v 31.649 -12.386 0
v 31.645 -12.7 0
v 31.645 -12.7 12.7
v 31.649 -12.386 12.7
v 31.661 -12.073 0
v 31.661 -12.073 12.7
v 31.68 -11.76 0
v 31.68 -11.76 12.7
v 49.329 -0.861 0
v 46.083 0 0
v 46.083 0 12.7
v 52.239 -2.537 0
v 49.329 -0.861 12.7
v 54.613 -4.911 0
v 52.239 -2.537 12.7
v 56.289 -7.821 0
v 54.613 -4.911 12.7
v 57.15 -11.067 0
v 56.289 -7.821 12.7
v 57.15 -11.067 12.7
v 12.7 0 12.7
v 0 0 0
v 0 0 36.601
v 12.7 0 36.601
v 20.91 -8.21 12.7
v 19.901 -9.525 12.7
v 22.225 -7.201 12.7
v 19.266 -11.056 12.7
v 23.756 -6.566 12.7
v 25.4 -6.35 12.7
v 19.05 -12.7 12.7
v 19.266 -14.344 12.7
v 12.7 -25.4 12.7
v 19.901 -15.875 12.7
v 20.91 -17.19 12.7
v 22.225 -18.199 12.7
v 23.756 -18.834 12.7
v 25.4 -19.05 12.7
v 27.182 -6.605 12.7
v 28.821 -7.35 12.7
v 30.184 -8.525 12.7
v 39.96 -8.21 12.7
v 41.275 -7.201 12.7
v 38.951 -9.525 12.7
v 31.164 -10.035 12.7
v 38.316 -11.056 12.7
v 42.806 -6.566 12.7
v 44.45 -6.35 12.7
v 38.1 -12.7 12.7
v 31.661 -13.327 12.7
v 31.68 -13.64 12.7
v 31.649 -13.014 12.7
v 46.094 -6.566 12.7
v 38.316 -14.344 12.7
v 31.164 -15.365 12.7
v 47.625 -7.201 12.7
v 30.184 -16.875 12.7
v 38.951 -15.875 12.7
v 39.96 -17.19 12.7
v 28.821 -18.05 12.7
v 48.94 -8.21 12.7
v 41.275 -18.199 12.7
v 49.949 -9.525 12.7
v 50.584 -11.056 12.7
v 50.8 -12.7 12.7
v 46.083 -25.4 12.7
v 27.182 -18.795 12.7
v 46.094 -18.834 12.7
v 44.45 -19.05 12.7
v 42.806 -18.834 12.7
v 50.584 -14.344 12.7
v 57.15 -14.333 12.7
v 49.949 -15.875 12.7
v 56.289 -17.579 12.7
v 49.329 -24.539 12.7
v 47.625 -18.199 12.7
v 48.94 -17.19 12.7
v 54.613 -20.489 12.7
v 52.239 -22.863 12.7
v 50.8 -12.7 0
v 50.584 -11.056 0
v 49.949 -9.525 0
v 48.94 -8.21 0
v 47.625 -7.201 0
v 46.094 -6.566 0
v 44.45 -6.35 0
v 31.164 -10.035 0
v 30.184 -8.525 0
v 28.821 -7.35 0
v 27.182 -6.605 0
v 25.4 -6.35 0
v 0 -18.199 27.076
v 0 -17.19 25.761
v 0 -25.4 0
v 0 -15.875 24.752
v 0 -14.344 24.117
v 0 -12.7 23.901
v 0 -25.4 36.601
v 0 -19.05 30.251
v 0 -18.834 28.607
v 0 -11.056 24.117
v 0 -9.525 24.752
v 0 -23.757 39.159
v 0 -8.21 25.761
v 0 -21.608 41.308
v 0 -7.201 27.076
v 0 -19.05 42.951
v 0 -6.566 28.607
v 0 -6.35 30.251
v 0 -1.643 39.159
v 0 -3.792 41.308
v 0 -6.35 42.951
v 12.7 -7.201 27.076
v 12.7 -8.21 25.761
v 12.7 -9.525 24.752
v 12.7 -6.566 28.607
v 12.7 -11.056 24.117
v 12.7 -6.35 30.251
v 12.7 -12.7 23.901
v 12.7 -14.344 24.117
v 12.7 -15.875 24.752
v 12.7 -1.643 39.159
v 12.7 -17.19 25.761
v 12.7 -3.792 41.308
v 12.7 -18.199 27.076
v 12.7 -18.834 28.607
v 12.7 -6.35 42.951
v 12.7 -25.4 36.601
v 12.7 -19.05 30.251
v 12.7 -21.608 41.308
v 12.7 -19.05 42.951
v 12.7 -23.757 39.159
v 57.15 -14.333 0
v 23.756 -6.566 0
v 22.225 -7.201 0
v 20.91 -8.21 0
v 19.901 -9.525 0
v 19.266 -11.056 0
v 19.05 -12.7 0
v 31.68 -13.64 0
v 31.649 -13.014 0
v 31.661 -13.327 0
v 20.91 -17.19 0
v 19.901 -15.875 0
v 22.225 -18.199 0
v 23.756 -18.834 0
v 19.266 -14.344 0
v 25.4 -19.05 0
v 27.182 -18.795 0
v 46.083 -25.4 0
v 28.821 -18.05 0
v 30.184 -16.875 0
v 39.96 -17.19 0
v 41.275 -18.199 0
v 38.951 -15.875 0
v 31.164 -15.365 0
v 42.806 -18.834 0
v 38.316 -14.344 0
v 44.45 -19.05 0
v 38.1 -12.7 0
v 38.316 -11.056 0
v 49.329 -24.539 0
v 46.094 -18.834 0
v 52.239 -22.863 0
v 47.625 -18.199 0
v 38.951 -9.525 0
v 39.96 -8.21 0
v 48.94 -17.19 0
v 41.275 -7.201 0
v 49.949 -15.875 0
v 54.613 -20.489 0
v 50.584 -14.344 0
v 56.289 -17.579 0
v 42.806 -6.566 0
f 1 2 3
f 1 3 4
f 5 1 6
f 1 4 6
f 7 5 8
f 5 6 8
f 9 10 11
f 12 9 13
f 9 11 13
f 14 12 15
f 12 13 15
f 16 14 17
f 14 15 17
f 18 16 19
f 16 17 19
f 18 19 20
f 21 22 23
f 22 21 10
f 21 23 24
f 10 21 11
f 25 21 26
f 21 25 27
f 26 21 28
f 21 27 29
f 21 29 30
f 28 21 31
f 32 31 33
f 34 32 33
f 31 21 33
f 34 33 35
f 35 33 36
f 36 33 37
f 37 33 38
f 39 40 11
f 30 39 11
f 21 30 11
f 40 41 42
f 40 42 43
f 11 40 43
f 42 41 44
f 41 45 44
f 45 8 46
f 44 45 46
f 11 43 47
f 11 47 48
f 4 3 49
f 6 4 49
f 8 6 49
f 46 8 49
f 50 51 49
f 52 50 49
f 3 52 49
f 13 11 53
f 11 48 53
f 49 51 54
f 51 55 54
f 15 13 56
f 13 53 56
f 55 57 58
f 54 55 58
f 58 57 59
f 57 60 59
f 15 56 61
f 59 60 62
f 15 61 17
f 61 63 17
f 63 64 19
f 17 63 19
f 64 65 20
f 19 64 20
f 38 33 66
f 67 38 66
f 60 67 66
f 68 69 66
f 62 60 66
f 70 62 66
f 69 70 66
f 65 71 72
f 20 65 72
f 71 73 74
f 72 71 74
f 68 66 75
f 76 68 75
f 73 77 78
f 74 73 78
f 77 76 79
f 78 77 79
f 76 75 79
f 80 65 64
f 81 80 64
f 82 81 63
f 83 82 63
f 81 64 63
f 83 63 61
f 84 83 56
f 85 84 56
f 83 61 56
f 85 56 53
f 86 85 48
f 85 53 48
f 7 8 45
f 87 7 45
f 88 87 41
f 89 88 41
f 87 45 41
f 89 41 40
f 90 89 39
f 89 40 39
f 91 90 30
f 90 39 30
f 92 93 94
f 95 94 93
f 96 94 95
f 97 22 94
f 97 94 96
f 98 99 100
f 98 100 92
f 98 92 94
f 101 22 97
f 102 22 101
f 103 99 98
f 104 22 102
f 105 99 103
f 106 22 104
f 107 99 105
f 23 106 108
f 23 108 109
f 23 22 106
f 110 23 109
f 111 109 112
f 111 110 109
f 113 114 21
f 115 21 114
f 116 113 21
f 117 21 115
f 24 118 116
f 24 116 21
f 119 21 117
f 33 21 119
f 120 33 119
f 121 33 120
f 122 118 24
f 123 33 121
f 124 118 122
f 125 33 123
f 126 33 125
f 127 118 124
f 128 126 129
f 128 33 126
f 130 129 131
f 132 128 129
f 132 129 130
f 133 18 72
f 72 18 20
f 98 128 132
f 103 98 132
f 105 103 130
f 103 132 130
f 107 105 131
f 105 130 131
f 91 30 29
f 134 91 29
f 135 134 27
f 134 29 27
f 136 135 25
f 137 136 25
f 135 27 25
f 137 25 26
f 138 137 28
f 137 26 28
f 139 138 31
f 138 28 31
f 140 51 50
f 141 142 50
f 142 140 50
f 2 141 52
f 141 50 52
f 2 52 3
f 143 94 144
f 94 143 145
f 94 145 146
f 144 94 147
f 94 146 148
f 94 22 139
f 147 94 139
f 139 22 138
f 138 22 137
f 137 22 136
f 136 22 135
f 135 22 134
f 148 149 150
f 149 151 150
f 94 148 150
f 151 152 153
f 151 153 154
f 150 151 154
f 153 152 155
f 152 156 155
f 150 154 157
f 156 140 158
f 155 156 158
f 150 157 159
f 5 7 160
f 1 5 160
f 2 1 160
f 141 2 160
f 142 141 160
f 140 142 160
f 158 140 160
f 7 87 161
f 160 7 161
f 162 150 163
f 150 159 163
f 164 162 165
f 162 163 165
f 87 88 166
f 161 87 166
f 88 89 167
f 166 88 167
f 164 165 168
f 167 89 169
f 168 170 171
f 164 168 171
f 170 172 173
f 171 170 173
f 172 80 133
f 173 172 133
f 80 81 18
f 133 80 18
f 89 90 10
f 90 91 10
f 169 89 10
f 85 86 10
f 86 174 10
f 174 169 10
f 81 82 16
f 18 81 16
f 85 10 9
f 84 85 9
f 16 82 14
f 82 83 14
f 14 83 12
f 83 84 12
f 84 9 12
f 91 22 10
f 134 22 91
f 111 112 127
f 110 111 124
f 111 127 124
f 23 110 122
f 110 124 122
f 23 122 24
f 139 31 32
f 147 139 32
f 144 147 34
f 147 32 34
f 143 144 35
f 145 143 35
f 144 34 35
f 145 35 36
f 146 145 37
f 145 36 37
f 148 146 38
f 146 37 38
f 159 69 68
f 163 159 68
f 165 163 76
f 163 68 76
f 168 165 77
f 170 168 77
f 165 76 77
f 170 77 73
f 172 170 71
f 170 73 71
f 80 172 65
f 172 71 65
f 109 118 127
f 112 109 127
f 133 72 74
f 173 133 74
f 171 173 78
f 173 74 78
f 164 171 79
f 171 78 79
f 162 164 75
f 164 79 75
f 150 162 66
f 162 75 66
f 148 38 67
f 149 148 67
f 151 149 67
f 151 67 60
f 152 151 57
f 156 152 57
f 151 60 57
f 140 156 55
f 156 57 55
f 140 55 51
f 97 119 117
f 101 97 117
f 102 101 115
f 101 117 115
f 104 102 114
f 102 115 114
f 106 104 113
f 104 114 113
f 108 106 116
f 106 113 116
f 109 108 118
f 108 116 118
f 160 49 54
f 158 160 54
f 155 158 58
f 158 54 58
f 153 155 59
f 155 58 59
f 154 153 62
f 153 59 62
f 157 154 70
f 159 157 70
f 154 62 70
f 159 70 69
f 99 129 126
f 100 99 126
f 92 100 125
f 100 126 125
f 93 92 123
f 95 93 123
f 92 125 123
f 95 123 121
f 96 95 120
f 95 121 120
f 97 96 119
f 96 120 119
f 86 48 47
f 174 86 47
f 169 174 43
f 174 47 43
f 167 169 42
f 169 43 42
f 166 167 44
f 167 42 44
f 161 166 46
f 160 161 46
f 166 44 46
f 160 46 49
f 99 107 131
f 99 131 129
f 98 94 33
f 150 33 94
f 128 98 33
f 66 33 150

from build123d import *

# Parameters (mm, degrees)
F0_W     = 57.15
F0_H     = 44.45
F1_DEPTH = 25.4
F2_W     = 44.45
F2_H     = 31.75
F3_DEPTH = 25.4
F5_DEPTH = 25.4
F7_DEPTH = 25.4


with BuildPart() as f1:
    # F0 (on Front) → F1 (new body)
    with BuildSketch(Plane.XZ):
        with Locations((28.575, 22.225)):
            Rectangle(F0_W, F0_H)
    extrude(amount=F1_DEPTH)

    # F2 (on face) → F3 (cut)
    with BuildSketch(Plane.XZ.offset(25.4)):
        with Locations((34.925, 28.575)):
            Rectangle(F2_W, F2_H)
    extrude(amount=-F3_DEPTH, mode=Mode.SUBTRACT)

    # F4 (on face) → F5 (cut)
    with BuildSketch(Plane.YZ.offset(12.7)):
        with BuildLine():
            ThreePointArc((-19.05, 42.9509683429), (-15.9622689922, 44.0701615546), (-12.7, 44.45))
            Line((-12.7, 44.45), (-25.4, 44.45))
            Line((-25.4, 44.45), (-25.4, 36.6009683429))
            ThreePointArc((-25.4, 36.6009683429), (-22.740231571, 40.2911999139), (-19.05, 42.9509683429))
        make_face()
        with BuildLine():
            Line((0, 44.45), (-12.7, 44.45))
            ThreePointArc((-12.7, 44.45), (-9.4377310078, 44.0701615546), (-6.35, 42.9509683429))
            ThreePointArc((-6.35, 42.9509683429), (-2.659768429, 40.2911999139), (0, 36.6009683429))
            Line((0, 36.6009683429), (0, 44.45))
        make_face()
        with BuildLine():
            Line((-12.7, 36.6009683429), (-12.7, 44.45))
            ThreePointArc((-12.7, 44.45), (-15.9622689922, 44.0701615546), (-19.05, 42.9509683429))
            Line((-19.05, 42.9509683429), (-19.05, 30.2509683429))
            ThreePointArc((-19.05, 30.2509683429), (-17.1901280605, 34.7410964034), (-12.7, 36.6009683429))
        make_face()
        with BuildLine():
            ThreePointArc((-6.35, 42.9509683429), (-9.4377310078, 44.0701615546), (-12.7, 44.45))
            Line((-12.7, 44.45), (-12.7, 36.6009683429))
            ThreePointArc((-12.7, 36.6009683429), (-8.2098719395, 34.7410964034), (-6.35, 30.2509683429))
            Line((-6.35, 30.2509683429), (-6.35, 42.9509683429))
        make_face()
        with BuildLine():
            Line((-12.7, 23.9009683429), (-12.7, 30.2509683429))
            Line((-12.7, 30.2509683429), (-19.05, 30.2509683429))
            ThreePointArc((-19.05, 30.2509683429), (-17.1901280605, 25.7608402823), (-12.7, 23.9009683429))
        make_face()
        with BuildLine():
            Line((-12.7, 30.2509683429), (-12.7, 36.6009683429))
            ThreePointArc((-12.7, 36.6009683429), (-17.1901280605, 34.7410964034), (-19.05, 30.2509683429))
            Line((-19.05, 30.2509683429), (-12.7, 30.2509683429))
        make_face()
        with BuildLine():
            Line((-6.35, 30.2509683429), (-12.7, 30.2509683429))
            Line((-12.7, 30.2509683429), (-12.7, 23.9009683429))
            ThreePointArc((-12.7, 23.9009683429), (-8.2098719395, 25.7608402823), (-6.35, 30.2509683429))
        make_face()
        with BuildLine():
            ThreePointArc((-6.35, 30.2509683429), (-8.2098719395, 34.7410964034), (-12.7, 36.6009683429))
            Line((-12.7, 36.6009683429), (-12.7, 30.2509683429))
            Line((-12.7, 30.2509683429), (-6.35, 30.2509683429))
        make_face()
    extrude(amount=-F5_DEPTH, mode=Mode.SUBTRACT)

    # F6 (on face) → F7 (cut)
    with BuildSketch(Plane.XY.offset(12.7)):
        with BuildLine():
            ThreePointArc((31.6799919585, -11.7596803731), (29.5443618549, -7.8888915191), (25.4, -6.35))
            Line((25.4, -6.35), (25.4, -12.7))
            Line((25.4, -12.7), (31.6454185395, -12.7))
            ThreePointArc((31.6454185395, -12.7), (31.6540648134, -12.2295224974), (31.6799919585, -11.7596803731))
        make_face()
        with BuildLine():
            Line((25.4, -12.7), (25.4, -6.35))
            ThreePointArc((25.4, -6.35), (20.9098719395, -8.2098719395), (19.05, -12.7))
            Line((19.05, -12.7), (25.4, -12.7))
        make_face()
        with BuildLine():
            ThreePointArc((46.0831890214, 0), (44.45, 0.1045814605), (42.8168109786, 0))
            Line((42.8168109786, 0), (44.45, 0))
            Line((44.45, 0), (46.0831890214, 0))
        make_face()
        with BuildLine():
            Line((31.6454185395, -12.7), (25.4, -12.7))
            Line((25.4, -12.7), (25.4, -19.05))
            ThreePointArc((25.4, -19.05), (29.5443618549, -17.5111084809), (31.6799919585, -13.6403196269))
            ThreePointArc((31.6799919585, -13.6403196269), (31.6540648134, -13.1704775026), (31.6454185395, -12.7))
        make_face()
        with BuildLine():
            Line((25.4, -19.05), (25.4, -12.7))
            Line((25.4, -12.7), (19.05, -12.7))
            ThreePointArc((19.05, -12.7), (20.9098719395, -17.1901280605), (25.4, -19.05))
        make_face()
        with BuildLine():
            Line((57.15, 0), (46.0831890214, 0))
            ThreePointArc((46.0831890214, 0), (53.504206381, -3.645793619), (57.15, -11.0668109786))
            Line((57.15, -11.0668109786), (57.15, 0))
        make_face()
        with BuildLine():
            ThreePointArc((50.8, -12.7), (48.9401280605, -8.2098719395), (44.45, -6.35))
            Line((44.45, -6.35), (44.45, -12.7))
            Line((44.45, -12.7), (50.8, -12.7))
        make_face()
        with BuildLine():
            Line((44.45, -12.7), (44.45, -6.35))
            ThreePointArc((44.45, -6.35), (39.9598719395, -8.2098719395), (38.1, -12.7))
            Line((38.1, -12.7), (44.45, -12.7))
        make_face()
        with BuildLine():
            Line((44.45, -12.7), (38.1, -12.7))
            ThreePointArc((38.1, -12.7), (39.9598719395, -17.1901280605), (44.45, -19.05))
            Line((44.45, -19.05), (44.45, -12.7))
        make_face()
        with BuildLine():
            Line((50.8, -12.7), (44.45, -12.7))
            Line((44.45, -12.7), (44.45, -19.05))
            ThreePointArc((44.45, -19.05), (48.9401280605, -17.1901280605), (50.8, -12.7))
        make_face()
        with BuildLine():
            Line((57.15, -25.4), (57.15, -14.3331890214))
            ThreePointArc((57.15, -14.3331890214), (53.504206381, -21.754206381), (46.0831890214, -25.4))
            Line((46.0831890214, -25.4), (57.15, -25.4))
        make_face()
    extrude(amount=-F7_DEPTH, mode=Mode.SUBTRACT)


solid = f1.part
